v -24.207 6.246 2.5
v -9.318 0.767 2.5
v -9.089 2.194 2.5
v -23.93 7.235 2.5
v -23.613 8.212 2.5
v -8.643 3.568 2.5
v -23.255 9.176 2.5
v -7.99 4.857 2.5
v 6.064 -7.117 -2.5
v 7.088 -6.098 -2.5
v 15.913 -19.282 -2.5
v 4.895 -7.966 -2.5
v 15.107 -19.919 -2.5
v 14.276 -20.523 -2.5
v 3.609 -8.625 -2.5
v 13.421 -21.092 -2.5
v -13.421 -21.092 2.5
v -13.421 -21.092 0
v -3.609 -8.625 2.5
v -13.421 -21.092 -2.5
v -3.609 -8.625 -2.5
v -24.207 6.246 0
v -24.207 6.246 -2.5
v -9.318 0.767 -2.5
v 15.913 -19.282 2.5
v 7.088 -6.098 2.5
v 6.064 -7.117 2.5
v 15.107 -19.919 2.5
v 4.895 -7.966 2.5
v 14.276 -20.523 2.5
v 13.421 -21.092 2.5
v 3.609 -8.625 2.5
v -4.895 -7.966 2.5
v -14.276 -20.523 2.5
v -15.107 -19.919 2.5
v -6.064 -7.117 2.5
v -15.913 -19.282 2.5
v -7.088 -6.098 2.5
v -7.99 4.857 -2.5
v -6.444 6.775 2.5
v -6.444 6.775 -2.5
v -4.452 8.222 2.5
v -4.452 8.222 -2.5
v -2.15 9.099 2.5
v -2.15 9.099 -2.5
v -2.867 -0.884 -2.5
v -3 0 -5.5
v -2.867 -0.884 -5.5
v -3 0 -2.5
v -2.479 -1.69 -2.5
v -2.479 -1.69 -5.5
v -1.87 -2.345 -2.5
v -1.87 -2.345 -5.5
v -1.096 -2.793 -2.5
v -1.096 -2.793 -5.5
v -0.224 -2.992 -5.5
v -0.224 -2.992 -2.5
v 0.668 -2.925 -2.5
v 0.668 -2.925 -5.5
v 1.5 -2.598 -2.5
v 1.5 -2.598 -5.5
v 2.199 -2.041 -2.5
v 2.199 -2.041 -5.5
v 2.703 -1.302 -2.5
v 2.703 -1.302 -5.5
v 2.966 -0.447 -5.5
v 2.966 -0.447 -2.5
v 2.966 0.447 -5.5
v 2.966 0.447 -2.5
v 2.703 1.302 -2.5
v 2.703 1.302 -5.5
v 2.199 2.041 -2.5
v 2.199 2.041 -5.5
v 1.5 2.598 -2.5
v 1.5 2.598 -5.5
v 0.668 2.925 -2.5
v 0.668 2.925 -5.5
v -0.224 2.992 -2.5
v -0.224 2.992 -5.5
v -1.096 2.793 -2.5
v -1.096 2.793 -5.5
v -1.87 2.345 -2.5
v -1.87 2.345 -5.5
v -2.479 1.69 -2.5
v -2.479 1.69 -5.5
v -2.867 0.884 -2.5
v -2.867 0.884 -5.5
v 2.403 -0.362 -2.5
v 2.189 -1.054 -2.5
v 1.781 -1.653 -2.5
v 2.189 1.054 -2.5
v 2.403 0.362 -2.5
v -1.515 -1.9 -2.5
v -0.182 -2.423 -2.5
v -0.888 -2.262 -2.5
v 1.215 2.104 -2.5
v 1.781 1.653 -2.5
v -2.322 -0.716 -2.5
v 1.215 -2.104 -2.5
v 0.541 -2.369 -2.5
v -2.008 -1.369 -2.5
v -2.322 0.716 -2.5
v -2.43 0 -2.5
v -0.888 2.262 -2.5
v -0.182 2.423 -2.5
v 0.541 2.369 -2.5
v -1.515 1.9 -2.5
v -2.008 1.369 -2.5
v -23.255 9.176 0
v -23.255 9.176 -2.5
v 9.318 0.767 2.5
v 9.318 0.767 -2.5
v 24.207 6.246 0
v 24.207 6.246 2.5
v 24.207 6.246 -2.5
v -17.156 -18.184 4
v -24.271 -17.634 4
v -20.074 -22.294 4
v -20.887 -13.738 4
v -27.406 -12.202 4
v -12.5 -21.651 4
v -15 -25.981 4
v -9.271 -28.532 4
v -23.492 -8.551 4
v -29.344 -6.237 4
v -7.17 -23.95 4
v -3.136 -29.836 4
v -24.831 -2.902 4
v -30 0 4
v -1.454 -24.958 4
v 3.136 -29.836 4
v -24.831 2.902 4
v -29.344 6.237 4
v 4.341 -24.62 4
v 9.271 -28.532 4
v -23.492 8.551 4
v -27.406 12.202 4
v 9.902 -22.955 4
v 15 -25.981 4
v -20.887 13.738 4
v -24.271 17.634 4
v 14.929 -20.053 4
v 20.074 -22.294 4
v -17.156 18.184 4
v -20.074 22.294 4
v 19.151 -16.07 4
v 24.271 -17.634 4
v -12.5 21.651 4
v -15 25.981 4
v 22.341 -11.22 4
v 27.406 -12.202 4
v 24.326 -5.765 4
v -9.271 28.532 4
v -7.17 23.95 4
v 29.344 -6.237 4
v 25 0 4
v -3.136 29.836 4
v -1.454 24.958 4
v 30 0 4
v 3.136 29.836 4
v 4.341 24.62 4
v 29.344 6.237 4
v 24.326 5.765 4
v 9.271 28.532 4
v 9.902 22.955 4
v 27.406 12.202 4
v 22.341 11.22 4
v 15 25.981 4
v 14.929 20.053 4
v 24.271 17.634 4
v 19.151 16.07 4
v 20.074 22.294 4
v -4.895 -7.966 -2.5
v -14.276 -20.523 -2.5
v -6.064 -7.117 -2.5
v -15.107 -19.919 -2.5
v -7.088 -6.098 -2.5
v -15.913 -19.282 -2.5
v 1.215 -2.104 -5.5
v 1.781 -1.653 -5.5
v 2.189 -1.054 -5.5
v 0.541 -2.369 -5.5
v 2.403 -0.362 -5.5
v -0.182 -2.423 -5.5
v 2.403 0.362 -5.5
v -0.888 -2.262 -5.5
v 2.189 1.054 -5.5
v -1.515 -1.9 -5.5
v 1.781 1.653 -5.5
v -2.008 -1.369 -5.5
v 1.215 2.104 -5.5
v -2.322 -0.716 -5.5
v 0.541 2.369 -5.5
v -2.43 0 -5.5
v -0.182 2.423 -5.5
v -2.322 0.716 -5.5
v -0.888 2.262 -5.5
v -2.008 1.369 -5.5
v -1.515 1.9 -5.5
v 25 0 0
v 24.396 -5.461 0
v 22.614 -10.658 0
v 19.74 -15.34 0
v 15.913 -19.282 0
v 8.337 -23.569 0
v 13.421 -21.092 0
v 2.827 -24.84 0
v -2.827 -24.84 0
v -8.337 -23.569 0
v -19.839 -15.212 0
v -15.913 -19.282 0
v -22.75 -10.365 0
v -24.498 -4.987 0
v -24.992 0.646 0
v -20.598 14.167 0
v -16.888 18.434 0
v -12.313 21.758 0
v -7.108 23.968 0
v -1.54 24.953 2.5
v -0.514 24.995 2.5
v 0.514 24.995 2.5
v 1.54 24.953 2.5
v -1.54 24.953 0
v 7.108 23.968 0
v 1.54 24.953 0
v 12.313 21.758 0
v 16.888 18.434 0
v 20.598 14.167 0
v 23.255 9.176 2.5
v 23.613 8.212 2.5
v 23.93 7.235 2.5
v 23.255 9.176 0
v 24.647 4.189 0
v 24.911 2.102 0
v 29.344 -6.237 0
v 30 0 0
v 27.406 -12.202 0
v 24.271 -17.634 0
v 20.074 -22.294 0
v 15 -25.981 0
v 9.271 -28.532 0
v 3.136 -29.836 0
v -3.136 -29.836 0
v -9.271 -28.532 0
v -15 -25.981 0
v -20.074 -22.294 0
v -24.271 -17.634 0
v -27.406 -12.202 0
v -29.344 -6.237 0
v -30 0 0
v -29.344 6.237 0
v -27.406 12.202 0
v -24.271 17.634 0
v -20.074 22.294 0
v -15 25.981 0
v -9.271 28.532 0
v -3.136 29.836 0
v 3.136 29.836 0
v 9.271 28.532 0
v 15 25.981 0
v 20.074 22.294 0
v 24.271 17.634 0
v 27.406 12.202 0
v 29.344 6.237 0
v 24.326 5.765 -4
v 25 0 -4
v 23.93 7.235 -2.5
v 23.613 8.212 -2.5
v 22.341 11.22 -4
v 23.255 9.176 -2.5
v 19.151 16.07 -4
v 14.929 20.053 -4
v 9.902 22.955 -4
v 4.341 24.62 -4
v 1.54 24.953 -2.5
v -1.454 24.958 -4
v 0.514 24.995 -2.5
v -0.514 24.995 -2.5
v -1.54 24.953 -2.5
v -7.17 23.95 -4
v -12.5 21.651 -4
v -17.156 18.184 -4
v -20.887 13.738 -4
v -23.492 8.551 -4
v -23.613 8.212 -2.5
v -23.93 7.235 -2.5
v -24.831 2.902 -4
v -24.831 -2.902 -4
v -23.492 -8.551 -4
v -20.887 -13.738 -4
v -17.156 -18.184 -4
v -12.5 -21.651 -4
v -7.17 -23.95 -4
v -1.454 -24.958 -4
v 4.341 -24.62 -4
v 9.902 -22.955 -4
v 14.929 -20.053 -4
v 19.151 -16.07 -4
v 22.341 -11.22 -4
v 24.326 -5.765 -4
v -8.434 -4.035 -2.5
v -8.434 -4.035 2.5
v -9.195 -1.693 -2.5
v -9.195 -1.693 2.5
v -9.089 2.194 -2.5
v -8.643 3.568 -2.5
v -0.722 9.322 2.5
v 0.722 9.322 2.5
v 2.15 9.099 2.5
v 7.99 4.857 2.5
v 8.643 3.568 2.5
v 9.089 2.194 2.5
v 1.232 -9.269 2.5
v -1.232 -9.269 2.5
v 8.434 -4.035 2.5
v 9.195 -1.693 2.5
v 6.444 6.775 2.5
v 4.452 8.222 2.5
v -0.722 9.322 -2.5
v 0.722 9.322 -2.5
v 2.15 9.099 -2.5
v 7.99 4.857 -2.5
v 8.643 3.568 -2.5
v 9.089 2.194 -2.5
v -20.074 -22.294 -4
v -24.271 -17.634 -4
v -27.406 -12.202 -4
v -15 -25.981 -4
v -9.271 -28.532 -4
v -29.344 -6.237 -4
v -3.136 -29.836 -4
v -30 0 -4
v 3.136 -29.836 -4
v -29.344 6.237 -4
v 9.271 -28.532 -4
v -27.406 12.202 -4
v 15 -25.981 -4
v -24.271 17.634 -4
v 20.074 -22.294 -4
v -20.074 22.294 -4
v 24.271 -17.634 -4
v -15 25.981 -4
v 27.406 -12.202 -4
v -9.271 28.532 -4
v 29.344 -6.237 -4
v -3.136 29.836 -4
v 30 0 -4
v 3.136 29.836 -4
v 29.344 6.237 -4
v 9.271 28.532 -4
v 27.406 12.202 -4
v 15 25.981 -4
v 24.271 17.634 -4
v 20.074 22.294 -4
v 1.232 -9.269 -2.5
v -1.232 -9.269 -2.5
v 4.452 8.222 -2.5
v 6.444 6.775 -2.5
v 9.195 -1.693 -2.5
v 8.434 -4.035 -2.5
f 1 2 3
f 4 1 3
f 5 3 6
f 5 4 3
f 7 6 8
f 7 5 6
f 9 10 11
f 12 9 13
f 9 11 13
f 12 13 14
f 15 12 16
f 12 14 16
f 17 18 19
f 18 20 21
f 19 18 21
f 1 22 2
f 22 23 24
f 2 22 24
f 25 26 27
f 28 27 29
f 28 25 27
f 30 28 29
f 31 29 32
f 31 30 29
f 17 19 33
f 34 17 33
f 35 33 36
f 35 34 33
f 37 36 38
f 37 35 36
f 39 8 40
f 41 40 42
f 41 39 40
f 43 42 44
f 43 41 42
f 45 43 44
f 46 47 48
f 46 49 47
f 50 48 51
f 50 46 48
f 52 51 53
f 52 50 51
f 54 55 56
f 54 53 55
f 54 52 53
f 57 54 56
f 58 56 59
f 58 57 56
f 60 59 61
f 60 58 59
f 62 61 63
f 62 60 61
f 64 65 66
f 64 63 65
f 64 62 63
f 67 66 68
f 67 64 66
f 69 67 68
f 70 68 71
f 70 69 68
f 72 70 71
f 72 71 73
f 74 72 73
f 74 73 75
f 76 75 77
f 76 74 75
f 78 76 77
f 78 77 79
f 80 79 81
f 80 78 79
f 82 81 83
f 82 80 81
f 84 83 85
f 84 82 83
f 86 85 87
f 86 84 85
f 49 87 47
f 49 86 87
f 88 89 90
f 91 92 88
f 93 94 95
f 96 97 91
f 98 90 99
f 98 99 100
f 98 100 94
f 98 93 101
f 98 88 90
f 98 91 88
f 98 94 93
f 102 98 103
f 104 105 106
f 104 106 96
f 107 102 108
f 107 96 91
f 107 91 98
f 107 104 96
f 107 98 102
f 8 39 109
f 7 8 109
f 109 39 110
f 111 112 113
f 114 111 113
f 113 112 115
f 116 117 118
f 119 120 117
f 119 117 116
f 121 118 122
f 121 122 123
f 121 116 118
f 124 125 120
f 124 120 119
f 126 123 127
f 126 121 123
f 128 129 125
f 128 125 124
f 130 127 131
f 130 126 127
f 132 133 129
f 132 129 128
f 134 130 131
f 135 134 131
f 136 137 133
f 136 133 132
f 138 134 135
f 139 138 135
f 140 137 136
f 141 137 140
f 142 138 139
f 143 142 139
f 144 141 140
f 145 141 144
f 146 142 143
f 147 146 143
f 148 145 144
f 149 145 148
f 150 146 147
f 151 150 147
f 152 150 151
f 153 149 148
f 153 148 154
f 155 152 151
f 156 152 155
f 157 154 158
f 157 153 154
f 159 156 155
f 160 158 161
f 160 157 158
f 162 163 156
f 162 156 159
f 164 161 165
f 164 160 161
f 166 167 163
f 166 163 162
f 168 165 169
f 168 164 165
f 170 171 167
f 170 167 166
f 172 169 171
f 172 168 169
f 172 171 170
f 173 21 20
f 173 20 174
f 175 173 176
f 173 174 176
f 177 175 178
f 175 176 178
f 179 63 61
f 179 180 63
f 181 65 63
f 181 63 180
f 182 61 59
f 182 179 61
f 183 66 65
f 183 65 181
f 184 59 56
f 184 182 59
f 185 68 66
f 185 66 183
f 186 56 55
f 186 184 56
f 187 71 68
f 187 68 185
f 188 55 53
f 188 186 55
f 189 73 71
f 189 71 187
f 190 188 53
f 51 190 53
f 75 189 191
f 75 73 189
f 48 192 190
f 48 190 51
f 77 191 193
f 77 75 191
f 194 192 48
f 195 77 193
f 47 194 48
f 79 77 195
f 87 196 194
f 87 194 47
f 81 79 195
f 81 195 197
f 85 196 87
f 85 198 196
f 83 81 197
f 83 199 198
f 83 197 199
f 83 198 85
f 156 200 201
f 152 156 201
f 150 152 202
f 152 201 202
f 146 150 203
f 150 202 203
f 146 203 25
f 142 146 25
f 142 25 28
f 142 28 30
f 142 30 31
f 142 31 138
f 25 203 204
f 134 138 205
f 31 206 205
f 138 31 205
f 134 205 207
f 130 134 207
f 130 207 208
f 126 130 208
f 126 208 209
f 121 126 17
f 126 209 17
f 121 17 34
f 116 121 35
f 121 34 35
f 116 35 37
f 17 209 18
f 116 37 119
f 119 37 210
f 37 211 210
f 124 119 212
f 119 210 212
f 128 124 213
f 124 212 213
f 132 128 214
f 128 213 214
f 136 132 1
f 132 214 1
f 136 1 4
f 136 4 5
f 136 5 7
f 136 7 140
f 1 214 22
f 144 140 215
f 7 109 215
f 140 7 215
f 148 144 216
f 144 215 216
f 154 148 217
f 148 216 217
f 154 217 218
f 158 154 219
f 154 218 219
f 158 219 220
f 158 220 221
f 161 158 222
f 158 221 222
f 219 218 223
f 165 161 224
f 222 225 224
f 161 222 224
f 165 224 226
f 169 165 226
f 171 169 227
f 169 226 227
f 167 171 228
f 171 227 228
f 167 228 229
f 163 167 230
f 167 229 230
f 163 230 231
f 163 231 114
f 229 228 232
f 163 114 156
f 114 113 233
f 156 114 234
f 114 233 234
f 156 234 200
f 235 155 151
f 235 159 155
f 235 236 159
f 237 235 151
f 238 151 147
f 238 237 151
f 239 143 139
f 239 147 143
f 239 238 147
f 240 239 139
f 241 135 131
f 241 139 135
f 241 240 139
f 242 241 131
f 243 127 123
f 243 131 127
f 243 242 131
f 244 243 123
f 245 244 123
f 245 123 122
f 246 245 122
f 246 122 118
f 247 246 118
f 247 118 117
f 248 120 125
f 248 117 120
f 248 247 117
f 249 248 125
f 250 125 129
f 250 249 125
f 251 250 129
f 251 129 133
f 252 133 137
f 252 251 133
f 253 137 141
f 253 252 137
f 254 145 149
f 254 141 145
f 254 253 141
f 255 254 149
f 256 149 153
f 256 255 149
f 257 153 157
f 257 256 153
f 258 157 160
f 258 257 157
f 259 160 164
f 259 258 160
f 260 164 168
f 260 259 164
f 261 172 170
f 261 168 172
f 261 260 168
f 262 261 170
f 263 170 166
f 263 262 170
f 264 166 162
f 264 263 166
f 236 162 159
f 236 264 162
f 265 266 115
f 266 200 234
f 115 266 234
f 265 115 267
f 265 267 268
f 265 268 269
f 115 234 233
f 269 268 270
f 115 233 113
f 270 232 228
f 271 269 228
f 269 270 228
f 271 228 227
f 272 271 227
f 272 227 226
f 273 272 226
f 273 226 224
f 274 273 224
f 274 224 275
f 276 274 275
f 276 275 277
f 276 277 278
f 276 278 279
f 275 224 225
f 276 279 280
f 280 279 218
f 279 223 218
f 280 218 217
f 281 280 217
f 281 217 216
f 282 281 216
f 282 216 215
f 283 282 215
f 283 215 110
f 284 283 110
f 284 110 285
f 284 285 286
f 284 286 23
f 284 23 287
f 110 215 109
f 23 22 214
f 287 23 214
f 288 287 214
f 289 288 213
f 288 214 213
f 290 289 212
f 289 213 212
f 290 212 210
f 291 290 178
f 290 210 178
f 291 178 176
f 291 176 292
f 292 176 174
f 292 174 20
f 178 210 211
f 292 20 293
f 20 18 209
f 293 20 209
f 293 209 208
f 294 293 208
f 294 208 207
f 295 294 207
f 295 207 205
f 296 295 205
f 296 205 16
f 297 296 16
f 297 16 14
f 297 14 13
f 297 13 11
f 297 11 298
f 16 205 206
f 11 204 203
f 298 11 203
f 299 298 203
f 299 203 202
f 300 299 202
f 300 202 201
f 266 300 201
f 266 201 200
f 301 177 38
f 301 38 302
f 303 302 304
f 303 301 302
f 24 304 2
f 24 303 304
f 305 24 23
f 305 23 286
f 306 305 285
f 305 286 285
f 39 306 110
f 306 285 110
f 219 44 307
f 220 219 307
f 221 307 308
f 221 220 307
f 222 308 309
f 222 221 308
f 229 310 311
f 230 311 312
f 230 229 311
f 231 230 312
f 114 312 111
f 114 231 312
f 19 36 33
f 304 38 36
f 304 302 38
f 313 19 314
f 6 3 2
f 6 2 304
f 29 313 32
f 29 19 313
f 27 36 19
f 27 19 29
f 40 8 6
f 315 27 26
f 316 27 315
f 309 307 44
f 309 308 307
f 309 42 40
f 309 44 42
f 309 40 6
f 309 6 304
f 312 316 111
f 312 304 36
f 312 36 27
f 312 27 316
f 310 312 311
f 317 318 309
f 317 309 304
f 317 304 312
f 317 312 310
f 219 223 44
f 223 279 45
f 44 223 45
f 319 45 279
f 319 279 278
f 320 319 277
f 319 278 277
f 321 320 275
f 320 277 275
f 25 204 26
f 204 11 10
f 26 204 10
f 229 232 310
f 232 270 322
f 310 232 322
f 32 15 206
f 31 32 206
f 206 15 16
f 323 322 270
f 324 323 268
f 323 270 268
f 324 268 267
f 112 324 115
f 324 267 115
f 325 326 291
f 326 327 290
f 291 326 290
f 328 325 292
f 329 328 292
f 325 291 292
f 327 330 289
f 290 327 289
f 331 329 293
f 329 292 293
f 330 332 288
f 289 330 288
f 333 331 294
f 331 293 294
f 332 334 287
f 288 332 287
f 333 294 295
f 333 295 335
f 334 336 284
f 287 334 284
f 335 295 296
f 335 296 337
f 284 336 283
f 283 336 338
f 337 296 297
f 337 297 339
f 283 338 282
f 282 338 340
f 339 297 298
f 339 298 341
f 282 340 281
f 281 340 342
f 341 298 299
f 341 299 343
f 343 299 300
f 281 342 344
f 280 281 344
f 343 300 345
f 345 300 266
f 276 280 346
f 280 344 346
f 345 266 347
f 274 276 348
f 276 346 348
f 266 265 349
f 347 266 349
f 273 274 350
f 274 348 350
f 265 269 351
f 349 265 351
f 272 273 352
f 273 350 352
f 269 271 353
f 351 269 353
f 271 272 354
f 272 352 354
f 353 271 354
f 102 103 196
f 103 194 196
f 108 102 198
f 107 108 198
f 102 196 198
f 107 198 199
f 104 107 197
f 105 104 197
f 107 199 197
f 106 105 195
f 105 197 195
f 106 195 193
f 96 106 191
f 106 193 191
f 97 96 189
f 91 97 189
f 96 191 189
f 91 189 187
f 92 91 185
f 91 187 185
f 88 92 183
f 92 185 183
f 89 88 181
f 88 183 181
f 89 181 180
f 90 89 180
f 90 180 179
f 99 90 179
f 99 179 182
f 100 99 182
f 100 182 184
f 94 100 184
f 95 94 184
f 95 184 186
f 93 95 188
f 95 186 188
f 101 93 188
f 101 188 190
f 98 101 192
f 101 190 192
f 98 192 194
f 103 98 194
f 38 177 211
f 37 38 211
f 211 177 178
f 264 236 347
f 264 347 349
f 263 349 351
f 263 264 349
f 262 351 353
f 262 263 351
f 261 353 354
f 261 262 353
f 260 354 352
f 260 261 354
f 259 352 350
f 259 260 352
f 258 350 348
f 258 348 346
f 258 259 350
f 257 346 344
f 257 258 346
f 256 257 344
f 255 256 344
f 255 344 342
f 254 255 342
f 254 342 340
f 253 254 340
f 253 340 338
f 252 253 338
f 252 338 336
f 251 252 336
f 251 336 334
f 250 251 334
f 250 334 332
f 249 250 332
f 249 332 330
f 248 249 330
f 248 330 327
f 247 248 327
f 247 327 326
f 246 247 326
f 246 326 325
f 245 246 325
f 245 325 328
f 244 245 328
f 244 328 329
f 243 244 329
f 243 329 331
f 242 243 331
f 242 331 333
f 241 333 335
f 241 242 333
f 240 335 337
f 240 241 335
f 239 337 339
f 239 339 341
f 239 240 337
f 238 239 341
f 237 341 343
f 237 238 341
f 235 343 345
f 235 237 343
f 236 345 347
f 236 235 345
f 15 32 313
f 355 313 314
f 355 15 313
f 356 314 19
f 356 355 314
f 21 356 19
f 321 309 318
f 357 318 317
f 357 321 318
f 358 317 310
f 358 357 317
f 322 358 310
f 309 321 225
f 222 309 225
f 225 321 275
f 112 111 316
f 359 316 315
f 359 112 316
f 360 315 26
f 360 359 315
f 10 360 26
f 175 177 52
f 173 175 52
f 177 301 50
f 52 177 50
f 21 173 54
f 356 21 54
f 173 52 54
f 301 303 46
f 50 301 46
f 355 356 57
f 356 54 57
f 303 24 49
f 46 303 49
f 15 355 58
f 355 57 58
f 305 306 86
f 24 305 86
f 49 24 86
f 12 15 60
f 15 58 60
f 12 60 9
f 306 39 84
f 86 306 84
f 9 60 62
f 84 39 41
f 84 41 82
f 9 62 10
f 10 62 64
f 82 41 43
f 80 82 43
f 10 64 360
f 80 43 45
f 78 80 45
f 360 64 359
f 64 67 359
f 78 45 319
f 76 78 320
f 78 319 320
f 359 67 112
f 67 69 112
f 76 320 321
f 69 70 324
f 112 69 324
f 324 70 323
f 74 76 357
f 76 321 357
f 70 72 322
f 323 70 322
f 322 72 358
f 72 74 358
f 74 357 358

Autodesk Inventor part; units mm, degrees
ref_plane "YZ Plane" through (0, 0, 0) normal (1, 0, 0) x (0, 1, 0)
ref_plane "XZ Plane" through (0, 0, 0) normal (0, 1, 0) x (-1, 0, 0)
ref_plane "XY Plane" through (0, 0, 0) normal (0, 0, 1) x (1, 0, 0)
sketch "スケッチ1" plane through (0, 0, 0) normal (0, 0, 1) x (1, 0, 0)
  circle A0 centre (0, 0) radius 30
  circle A1 centre (0, 0) radius 25
  dimension "d0" = 60
  dimension "d1" = 5
extrude "押し出し1" add sketch "スケッチ1" along normal mid plane 8
sketch "スケッチ2" plane through (0, 0, 0) normal (0, 0, 1) x (1, 0, 0)
  circle A0 centre (0, 0) radius 9.35
  line L0 (-1.5, 26) -> (-2.5, 0)
  line L1 (-2.5, 0) -> (2.5, 0)
  line L2 (2.5, 0) -> (1.5, 26)
  line L3 (1.5, 26) -> (-1.5, 26)
  point P0 (0, 26)
  point P1 (-2.15, 9.0994)
  point P2 (2.15, 9.0994)
  dimension "d4" = 18.7
  dimension "d5" = 5
  dimension "d6" = 3
  dimension "d7" = 26
extrude "押し出し2" add sketch "スケッチ2" along normal mid plane 5
pattern_circular "円形状パターン1" count 5 over 360 about axis through (0, 0, -10) along (0, 0, 1) of "押し出し2"
sketch "スケッチ3" plane through (0, 0, -2.5) normal (0, 0, -1) x (-1, 0, 0)
  circle A0 centre (0, 0) radius 3
  dimension "d13" = 6
extrude "押し出し3" add sketch "スケッチ3" along normal blind 3
sketch "スケッチ4" plane through (0, 0, -5.5) normal (0, 0, -1) x (-1, 0, 0)
  circle A0 centre (0, 0) radius 2.43
  dimension "d16" = 4.86
extrude "押し出し4" cut sketch "スケッチ4" against normal blind 3
properties part number "FS90R-W"
